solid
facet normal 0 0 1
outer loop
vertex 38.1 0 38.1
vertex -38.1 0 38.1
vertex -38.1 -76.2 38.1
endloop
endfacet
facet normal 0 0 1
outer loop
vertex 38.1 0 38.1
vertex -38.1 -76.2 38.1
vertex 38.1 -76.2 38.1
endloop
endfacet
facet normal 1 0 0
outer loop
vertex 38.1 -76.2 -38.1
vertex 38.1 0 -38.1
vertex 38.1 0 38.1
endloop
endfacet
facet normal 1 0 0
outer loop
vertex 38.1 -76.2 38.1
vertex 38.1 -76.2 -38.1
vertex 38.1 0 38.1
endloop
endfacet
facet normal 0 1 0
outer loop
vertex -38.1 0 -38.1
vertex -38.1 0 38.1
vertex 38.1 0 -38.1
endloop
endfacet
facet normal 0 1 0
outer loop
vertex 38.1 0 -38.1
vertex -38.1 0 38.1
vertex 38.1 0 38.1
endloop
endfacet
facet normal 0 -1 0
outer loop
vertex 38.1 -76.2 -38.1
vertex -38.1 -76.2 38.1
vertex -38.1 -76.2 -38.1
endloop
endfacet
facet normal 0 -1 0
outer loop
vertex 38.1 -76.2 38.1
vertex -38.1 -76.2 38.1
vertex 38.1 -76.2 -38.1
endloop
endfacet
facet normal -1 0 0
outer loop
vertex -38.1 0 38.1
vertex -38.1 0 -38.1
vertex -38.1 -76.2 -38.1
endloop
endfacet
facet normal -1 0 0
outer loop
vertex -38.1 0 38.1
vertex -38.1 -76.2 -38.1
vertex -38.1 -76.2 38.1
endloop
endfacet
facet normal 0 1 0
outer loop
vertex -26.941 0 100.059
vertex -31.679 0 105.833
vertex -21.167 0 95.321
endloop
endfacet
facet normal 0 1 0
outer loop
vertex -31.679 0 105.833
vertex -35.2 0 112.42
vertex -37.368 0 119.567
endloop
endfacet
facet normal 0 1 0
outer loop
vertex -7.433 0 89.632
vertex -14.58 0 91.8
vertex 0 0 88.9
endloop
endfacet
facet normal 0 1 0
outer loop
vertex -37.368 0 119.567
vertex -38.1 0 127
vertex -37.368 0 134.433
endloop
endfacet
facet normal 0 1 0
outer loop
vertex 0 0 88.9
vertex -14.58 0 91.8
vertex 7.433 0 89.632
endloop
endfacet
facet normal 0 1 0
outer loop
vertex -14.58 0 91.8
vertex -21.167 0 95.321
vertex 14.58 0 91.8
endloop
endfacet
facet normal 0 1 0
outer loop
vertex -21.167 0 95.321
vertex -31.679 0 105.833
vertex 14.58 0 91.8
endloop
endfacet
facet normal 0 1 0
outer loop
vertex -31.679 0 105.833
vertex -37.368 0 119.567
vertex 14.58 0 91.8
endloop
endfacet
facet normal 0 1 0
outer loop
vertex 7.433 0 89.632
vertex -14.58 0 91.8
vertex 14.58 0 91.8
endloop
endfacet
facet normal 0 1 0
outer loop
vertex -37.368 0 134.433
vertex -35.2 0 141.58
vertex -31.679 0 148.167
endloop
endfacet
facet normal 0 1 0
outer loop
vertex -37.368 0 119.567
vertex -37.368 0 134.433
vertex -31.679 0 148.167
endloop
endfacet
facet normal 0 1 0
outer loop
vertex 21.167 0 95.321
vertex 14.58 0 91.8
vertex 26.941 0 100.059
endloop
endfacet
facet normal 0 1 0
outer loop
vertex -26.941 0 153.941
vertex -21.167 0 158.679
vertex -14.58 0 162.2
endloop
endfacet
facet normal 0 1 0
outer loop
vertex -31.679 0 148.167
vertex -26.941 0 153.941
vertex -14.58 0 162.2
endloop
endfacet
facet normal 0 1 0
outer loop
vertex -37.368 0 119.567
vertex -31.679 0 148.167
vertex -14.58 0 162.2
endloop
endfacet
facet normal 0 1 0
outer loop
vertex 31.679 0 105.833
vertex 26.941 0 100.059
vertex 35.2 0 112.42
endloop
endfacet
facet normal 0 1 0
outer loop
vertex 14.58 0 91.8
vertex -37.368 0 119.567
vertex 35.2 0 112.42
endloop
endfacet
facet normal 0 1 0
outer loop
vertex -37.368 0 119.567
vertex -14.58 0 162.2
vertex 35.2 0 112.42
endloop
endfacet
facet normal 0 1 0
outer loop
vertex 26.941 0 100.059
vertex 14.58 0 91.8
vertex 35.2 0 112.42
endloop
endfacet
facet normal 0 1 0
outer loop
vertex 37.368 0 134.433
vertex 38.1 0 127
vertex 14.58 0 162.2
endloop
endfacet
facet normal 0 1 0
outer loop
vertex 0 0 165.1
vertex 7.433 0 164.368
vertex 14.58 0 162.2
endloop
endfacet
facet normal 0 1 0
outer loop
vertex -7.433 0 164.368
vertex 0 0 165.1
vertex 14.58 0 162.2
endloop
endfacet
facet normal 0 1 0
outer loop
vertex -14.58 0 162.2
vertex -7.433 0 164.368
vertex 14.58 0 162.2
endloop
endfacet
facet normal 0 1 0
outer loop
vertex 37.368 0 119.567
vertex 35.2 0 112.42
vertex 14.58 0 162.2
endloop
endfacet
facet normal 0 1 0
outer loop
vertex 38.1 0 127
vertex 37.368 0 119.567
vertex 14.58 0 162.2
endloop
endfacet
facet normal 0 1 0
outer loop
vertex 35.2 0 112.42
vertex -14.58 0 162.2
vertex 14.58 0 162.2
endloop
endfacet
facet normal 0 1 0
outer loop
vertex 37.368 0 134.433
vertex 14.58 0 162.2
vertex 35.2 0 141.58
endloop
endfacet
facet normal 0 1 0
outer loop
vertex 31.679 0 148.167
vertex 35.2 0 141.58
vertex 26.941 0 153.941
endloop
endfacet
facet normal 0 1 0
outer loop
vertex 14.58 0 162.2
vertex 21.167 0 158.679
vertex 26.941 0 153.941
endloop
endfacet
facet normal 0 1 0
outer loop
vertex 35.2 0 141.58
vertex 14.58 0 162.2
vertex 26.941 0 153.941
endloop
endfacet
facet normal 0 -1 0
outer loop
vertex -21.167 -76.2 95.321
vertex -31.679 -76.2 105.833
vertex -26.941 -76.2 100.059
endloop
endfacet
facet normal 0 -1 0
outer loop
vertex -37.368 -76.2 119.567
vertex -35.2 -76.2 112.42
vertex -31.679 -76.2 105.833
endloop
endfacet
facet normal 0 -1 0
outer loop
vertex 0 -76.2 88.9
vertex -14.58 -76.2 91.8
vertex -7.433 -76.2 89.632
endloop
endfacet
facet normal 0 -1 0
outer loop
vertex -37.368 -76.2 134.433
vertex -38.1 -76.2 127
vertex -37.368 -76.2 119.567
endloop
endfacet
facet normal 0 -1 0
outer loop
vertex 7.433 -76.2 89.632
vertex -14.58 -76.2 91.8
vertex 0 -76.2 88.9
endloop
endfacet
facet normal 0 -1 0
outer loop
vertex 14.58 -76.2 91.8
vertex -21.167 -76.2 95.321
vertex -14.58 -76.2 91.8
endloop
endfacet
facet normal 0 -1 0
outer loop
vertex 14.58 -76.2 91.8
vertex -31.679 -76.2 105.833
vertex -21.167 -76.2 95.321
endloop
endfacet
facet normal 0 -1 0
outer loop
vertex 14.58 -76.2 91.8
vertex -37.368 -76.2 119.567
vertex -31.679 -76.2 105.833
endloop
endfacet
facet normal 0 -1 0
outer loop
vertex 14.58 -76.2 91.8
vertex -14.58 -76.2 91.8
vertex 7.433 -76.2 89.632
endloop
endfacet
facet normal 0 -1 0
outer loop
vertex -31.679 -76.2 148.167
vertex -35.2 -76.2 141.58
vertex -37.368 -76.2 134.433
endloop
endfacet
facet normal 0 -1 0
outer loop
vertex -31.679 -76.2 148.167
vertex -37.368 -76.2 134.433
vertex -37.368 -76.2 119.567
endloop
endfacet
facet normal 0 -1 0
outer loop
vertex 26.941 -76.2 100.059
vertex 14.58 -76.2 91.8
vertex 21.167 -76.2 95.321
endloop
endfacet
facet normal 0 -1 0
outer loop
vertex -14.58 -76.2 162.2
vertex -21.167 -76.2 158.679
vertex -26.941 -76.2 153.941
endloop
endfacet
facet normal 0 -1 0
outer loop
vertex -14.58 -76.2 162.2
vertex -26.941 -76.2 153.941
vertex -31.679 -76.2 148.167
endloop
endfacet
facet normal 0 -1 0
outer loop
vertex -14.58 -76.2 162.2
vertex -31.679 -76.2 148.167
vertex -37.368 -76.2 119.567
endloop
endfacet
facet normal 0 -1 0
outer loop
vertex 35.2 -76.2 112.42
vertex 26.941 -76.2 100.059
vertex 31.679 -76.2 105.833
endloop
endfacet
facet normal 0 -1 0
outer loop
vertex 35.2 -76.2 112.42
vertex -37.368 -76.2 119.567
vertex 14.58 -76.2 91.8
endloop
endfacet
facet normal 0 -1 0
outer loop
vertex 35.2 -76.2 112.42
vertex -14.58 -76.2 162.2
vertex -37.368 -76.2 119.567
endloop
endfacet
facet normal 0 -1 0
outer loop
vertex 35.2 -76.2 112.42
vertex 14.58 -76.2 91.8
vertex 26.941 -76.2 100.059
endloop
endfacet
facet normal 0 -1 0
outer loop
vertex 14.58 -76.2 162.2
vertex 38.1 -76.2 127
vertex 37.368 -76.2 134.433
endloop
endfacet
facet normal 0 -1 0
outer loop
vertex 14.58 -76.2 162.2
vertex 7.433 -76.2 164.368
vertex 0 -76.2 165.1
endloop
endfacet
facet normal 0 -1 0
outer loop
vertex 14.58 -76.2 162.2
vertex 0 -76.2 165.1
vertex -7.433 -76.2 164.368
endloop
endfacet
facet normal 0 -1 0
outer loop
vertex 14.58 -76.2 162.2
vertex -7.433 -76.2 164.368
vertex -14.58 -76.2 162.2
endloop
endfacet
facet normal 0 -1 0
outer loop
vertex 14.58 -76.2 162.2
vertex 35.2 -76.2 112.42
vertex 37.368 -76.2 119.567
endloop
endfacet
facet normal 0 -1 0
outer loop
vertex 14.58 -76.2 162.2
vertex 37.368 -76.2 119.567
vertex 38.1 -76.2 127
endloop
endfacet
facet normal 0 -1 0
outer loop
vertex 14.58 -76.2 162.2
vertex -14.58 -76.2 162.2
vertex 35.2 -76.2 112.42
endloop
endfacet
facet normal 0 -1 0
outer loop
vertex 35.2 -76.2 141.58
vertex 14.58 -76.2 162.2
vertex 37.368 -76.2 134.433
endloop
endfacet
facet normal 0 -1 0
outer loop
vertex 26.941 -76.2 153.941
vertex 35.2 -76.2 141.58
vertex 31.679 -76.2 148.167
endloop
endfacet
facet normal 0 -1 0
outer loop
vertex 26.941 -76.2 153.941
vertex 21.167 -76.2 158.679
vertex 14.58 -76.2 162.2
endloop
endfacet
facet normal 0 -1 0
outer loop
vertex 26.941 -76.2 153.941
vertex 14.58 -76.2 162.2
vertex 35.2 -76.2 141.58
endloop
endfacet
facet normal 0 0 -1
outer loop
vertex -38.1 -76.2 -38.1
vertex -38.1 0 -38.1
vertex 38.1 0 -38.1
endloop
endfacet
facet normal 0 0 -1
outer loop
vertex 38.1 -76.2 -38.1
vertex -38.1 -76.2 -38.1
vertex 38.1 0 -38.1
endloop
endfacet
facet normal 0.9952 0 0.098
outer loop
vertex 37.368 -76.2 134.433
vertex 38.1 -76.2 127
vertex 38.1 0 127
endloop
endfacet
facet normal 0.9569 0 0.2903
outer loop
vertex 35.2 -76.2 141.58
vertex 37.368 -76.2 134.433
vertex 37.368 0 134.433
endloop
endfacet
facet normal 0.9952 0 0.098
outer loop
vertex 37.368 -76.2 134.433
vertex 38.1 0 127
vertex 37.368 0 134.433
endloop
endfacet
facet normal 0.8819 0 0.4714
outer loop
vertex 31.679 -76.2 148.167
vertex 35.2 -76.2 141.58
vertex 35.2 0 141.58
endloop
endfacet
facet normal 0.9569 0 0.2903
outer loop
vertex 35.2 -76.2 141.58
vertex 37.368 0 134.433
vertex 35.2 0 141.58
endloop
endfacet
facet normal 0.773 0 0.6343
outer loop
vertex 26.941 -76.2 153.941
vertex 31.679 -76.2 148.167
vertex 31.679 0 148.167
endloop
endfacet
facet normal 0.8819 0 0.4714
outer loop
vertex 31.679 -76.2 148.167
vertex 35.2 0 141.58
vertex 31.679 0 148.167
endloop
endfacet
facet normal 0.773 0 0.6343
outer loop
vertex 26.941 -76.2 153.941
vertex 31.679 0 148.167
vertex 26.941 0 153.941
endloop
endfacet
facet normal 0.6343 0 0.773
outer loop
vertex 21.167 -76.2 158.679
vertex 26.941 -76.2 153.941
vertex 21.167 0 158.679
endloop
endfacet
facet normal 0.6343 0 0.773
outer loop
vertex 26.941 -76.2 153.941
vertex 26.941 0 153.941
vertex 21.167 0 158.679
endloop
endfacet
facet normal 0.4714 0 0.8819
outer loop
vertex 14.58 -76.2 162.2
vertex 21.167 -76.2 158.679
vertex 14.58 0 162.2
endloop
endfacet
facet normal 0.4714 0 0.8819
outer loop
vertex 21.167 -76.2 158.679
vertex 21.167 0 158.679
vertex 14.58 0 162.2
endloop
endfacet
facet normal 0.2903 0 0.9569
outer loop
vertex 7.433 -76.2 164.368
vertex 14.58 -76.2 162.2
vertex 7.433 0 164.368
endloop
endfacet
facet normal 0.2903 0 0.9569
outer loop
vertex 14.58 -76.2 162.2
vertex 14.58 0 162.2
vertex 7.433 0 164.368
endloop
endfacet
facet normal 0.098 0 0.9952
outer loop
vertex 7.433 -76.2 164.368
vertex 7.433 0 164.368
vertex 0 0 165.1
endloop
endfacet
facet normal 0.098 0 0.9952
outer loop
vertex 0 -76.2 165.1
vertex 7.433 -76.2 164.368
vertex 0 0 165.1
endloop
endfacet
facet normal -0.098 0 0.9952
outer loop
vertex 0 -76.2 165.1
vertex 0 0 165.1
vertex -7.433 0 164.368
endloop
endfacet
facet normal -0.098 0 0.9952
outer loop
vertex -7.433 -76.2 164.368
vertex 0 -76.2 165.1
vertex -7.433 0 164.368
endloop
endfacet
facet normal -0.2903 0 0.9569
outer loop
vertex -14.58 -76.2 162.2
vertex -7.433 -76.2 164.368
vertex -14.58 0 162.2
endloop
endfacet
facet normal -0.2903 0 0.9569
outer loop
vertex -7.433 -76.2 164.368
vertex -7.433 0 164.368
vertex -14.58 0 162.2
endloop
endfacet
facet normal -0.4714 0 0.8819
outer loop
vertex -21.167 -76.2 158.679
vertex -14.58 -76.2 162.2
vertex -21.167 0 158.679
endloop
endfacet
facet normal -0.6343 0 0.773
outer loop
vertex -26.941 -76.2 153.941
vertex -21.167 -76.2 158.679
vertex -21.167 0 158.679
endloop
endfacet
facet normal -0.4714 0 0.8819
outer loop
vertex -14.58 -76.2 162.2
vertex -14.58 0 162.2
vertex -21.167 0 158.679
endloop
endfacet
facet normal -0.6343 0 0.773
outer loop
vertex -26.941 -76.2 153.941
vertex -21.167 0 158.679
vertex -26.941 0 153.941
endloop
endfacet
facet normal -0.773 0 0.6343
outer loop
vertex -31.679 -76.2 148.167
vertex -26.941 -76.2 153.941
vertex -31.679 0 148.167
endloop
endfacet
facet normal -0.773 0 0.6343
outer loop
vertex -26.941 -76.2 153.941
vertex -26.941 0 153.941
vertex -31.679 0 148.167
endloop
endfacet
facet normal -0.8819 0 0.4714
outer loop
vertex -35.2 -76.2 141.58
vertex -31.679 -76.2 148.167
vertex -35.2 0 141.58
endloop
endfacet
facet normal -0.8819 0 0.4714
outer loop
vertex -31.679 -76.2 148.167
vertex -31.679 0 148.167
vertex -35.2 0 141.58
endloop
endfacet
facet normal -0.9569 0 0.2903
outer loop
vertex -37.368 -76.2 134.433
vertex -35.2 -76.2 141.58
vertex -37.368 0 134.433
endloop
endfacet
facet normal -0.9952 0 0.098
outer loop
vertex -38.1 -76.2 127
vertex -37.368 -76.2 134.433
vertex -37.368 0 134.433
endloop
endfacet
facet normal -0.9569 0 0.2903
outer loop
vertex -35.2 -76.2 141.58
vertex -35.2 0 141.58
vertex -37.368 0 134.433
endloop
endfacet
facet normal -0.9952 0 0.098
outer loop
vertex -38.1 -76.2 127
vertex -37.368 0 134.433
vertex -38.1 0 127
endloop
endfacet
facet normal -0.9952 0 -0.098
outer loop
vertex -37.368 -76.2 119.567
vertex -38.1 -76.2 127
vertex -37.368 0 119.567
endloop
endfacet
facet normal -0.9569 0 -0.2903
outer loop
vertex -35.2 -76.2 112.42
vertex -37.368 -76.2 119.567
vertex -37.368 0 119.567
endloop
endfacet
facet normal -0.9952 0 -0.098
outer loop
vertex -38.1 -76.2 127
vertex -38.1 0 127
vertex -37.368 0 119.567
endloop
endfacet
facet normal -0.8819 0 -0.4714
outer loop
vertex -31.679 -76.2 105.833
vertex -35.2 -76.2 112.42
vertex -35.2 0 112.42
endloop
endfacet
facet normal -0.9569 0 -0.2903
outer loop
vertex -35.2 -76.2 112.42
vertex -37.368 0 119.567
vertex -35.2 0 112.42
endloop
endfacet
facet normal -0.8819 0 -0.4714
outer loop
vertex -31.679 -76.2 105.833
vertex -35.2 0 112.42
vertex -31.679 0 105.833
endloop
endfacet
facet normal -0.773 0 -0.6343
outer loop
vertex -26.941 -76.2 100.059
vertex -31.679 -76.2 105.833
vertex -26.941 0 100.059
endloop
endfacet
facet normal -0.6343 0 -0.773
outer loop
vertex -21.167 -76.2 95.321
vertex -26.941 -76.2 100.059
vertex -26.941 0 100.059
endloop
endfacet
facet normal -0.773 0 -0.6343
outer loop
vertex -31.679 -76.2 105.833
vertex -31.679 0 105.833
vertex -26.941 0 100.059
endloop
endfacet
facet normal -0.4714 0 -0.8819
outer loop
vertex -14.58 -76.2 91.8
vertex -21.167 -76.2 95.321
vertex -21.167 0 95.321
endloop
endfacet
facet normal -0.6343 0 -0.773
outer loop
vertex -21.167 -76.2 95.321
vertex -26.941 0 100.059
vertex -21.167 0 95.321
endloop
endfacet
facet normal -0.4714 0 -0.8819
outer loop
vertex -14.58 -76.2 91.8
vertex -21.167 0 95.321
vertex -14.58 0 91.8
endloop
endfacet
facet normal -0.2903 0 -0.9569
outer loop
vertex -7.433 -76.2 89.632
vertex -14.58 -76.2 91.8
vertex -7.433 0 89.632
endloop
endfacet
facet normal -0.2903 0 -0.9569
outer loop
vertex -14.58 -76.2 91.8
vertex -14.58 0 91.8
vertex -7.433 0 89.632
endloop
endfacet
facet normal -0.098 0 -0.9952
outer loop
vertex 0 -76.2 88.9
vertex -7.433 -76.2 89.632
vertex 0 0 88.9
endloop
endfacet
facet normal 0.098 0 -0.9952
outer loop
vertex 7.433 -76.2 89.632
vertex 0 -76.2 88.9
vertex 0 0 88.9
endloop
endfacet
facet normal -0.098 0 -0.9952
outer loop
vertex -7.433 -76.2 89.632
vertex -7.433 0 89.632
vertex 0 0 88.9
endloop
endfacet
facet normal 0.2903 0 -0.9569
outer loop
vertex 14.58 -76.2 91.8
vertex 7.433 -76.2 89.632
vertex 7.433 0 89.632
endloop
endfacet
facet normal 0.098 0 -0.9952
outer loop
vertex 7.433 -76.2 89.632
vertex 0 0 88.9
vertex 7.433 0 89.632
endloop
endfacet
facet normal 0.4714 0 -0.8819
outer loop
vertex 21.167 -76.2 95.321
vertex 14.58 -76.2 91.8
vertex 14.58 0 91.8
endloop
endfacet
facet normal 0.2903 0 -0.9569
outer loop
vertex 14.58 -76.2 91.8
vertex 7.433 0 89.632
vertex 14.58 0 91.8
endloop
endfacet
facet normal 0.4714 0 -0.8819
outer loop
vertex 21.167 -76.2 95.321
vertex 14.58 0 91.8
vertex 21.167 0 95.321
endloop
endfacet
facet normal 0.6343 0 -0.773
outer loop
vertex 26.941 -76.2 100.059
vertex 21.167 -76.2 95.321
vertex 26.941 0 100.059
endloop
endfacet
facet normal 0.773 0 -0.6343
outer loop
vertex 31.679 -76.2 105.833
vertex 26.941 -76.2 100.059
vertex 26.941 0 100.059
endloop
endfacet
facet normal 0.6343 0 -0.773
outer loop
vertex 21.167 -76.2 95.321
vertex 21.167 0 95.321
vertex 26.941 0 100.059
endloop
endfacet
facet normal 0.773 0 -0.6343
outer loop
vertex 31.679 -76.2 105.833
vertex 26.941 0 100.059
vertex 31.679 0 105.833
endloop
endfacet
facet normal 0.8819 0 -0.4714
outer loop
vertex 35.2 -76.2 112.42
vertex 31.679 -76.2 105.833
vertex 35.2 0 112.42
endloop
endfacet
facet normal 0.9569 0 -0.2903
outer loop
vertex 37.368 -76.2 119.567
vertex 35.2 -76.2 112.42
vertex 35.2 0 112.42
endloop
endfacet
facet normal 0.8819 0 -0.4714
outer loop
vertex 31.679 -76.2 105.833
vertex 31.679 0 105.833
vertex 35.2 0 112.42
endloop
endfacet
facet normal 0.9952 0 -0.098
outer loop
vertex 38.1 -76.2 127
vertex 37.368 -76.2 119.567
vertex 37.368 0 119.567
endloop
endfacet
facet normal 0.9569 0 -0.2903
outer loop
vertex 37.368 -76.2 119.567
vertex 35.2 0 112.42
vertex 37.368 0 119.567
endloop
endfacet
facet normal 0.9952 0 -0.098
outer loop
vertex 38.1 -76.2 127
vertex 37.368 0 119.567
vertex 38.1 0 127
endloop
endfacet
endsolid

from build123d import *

# Parameters (mm, degrees)
F0_W     = 76.2
F0_H     = 76.2
F0_R     = 38.1
F1_DEPTH = 76.2


with BuildPart() as f1:
    # F0 (on Front) → F1 (new body)
    with BuildSketch(Plane.XZ):
        Rectangle(F0_W, F0_H)
        with Locations((0, 127)):
            Circle(F0_R)
    extrude(amount=F1_DEPTH)


solid = f1.part
